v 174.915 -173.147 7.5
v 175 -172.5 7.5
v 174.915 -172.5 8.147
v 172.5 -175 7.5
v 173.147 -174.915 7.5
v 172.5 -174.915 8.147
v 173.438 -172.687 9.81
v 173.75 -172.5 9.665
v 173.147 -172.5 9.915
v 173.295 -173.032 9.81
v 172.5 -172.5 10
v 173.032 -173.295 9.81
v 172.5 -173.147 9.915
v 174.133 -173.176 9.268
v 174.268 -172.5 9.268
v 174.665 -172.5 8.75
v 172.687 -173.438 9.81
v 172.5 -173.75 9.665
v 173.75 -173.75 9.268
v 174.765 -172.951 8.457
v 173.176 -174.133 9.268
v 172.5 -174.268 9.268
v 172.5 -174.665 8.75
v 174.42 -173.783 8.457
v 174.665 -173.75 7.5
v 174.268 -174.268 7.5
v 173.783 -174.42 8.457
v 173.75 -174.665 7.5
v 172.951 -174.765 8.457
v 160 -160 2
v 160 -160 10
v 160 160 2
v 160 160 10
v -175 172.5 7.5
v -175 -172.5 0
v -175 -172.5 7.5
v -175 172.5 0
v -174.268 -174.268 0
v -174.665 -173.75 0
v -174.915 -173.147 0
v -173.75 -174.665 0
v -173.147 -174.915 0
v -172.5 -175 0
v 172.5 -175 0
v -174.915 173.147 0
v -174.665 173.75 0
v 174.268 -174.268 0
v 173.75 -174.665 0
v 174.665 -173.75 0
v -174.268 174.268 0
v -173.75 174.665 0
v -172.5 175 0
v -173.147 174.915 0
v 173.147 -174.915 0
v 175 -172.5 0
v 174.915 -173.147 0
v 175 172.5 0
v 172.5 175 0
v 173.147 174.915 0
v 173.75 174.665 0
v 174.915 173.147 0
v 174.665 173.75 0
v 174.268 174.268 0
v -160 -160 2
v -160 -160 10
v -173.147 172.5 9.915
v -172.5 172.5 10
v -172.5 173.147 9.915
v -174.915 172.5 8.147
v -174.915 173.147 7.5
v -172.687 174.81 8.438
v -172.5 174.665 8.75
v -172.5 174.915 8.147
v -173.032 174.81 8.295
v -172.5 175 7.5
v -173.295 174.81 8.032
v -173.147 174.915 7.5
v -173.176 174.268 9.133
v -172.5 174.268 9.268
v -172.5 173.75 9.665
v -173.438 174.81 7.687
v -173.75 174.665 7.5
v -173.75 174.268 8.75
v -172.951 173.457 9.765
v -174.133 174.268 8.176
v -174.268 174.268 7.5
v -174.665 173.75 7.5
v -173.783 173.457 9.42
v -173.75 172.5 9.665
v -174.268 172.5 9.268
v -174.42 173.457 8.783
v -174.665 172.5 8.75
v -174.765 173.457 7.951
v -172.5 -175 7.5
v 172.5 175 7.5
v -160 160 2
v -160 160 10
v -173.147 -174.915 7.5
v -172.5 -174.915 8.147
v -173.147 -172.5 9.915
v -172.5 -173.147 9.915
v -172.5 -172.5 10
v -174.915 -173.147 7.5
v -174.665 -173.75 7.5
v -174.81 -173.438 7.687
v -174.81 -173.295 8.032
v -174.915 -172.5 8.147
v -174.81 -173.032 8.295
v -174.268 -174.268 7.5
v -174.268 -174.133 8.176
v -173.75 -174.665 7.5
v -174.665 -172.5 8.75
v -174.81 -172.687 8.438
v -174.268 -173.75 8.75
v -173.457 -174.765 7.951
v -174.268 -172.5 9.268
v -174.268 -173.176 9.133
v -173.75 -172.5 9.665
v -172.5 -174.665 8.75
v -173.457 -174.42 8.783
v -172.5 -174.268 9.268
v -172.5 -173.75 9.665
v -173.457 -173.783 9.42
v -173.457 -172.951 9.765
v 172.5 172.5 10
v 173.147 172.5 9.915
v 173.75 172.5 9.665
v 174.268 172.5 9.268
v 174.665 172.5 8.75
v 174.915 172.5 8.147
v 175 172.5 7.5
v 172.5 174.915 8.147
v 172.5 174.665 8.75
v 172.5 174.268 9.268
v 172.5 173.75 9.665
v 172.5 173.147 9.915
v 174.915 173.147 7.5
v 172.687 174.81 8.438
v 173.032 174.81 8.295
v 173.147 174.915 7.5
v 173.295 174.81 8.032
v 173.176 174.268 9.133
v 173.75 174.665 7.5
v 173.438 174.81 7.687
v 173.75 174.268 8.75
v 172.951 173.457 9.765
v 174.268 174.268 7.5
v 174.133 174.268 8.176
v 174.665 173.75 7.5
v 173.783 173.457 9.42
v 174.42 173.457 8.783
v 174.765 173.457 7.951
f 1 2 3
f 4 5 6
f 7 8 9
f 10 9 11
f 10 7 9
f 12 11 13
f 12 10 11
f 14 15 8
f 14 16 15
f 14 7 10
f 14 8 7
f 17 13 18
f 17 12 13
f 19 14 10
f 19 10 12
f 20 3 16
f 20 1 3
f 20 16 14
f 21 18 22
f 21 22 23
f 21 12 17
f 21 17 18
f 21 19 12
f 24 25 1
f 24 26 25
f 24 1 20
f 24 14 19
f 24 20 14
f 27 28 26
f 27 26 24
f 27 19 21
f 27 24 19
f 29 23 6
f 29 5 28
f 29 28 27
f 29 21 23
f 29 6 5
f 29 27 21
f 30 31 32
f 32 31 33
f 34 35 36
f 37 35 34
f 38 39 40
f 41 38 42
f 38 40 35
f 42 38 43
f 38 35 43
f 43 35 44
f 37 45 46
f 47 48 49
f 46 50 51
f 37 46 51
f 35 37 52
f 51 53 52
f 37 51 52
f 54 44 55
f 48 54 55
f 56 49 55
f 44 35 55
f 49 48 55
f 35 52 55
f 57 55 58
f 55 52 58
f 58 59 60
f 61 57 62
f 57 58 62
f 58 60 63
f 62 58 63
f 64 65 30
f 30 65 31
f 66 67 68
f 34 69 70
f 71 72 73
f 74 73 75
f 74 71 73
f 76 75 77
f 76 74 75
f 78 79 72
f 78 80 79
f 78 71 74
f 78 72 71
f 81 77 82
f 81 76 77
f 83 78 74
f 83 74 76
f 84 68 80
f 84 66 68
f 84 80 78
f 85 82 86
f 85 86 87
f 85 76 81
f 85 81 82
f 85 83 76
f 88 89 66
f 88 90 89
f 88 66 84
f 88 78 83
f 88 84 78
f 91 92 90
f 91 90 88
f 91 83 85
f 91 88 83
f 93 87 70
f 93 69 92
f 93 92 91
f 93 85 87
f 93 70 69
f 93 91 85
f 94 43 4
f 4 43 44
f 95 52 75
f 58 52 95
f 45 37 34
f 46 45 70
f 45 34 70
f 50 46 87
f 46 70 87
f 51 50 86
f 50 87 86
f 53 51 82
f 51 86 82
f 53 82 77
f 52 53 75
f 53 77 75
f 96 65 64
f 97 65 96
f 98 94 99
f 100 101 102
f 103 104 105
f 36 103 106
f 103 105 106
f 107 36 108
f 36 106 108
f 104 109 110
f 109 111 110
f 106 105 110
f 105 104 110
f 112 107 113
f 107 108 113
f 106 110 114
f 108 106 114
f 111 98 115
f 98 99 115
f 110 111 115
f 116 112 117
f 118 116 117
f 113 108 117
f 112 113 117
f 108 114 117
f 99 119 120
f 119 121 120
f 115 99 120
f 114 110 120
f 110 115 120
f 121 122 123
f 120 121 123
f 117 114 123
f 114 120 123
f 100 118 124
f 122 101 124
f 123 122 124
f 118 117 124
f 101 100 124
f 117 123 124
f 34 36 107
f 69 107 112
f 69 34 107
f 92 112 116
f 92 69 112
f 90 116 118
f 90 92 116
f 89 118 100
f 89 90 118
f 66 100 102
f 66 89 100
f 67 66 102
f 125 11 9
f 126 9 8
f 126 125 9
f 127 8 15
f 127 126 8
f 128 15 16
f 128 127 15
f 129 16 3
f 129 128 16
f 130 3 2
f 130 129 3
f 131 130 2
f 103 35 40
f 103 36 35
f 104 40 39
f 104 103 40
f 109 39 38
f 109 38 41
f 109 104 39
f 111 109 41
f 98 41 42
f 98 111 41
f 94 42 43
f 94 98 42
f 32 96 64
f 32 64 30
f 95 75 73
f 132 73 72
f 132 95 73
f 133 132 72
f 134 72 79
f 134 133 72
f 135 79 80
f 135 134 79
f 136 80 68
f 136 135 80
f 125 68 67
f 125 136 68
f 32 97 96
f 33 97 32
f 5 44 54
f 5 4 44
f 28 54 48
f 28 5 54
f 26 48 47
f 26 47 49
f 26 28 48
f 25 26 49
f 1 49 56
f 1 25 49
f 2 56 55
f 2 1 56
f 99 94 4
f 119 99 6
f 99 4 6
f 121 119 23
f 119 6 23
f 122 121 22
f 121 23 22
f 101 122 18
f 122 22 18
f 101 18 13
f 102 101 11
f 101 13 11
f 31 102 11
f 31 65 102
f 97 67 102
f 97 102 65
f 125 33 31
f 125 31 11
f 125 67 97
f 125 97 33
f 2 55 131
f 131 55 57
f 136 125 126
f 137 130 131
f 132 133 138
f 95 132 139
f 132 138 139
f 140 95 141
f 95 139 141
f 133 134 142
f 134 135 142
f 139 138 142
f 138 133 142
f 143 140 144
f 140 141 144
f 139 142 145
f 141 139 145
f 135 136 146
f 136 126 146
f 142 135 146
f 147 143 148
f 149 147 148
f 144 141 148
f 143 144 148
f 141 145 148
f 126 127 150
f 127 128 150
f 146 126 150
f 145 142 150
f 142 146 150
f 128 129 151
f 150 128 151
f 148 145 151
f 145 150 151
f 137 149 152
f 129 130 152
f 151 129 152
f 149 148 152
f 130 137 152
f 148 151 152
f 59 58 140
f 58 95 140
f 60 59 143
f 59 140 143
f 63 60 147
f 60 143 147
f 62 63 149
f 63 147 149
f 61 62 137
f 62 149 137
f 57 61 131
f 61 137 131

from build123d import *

# Parameters (mm, degrees)
F0_W     = 350
F0_H     = 350
F1_DEPTH = 10
F2_W     = 320
F2_H     = 320
F3_DEPTH = 8
F4_R     = 2.5


with BuildPart() as f1:
    # F0 (on Top) → F1 (new body)
    with BuildSketch(Plane.XY):
        Rectangle(F0_W, F0_H)
    extrude(amount=F1_DEPTH)

    # F2 (on face) → F3 (cut)
    with BuildSketch(Plane.XY.offset(10)):
        Rectangle(F2_W, F2_H)
    extrude(amount=-F3_DEPTH, mode=Mode.SUBTRACT)

    # F4
    f4_edges = [f1.edges().sort_by_distance(p)[0] for p in [
        (175, -175, 5),
        (175, 0, 10),
        (0, -175, 10),
        (-175, -175, 5),
        (-175, 0, 10),
        (0, 175, 10),
        (-175, 175, 5),
        (175, 175, 5),
    ]]
    fillet(f4_edges, radius=F4_R)


solid = f1.part
